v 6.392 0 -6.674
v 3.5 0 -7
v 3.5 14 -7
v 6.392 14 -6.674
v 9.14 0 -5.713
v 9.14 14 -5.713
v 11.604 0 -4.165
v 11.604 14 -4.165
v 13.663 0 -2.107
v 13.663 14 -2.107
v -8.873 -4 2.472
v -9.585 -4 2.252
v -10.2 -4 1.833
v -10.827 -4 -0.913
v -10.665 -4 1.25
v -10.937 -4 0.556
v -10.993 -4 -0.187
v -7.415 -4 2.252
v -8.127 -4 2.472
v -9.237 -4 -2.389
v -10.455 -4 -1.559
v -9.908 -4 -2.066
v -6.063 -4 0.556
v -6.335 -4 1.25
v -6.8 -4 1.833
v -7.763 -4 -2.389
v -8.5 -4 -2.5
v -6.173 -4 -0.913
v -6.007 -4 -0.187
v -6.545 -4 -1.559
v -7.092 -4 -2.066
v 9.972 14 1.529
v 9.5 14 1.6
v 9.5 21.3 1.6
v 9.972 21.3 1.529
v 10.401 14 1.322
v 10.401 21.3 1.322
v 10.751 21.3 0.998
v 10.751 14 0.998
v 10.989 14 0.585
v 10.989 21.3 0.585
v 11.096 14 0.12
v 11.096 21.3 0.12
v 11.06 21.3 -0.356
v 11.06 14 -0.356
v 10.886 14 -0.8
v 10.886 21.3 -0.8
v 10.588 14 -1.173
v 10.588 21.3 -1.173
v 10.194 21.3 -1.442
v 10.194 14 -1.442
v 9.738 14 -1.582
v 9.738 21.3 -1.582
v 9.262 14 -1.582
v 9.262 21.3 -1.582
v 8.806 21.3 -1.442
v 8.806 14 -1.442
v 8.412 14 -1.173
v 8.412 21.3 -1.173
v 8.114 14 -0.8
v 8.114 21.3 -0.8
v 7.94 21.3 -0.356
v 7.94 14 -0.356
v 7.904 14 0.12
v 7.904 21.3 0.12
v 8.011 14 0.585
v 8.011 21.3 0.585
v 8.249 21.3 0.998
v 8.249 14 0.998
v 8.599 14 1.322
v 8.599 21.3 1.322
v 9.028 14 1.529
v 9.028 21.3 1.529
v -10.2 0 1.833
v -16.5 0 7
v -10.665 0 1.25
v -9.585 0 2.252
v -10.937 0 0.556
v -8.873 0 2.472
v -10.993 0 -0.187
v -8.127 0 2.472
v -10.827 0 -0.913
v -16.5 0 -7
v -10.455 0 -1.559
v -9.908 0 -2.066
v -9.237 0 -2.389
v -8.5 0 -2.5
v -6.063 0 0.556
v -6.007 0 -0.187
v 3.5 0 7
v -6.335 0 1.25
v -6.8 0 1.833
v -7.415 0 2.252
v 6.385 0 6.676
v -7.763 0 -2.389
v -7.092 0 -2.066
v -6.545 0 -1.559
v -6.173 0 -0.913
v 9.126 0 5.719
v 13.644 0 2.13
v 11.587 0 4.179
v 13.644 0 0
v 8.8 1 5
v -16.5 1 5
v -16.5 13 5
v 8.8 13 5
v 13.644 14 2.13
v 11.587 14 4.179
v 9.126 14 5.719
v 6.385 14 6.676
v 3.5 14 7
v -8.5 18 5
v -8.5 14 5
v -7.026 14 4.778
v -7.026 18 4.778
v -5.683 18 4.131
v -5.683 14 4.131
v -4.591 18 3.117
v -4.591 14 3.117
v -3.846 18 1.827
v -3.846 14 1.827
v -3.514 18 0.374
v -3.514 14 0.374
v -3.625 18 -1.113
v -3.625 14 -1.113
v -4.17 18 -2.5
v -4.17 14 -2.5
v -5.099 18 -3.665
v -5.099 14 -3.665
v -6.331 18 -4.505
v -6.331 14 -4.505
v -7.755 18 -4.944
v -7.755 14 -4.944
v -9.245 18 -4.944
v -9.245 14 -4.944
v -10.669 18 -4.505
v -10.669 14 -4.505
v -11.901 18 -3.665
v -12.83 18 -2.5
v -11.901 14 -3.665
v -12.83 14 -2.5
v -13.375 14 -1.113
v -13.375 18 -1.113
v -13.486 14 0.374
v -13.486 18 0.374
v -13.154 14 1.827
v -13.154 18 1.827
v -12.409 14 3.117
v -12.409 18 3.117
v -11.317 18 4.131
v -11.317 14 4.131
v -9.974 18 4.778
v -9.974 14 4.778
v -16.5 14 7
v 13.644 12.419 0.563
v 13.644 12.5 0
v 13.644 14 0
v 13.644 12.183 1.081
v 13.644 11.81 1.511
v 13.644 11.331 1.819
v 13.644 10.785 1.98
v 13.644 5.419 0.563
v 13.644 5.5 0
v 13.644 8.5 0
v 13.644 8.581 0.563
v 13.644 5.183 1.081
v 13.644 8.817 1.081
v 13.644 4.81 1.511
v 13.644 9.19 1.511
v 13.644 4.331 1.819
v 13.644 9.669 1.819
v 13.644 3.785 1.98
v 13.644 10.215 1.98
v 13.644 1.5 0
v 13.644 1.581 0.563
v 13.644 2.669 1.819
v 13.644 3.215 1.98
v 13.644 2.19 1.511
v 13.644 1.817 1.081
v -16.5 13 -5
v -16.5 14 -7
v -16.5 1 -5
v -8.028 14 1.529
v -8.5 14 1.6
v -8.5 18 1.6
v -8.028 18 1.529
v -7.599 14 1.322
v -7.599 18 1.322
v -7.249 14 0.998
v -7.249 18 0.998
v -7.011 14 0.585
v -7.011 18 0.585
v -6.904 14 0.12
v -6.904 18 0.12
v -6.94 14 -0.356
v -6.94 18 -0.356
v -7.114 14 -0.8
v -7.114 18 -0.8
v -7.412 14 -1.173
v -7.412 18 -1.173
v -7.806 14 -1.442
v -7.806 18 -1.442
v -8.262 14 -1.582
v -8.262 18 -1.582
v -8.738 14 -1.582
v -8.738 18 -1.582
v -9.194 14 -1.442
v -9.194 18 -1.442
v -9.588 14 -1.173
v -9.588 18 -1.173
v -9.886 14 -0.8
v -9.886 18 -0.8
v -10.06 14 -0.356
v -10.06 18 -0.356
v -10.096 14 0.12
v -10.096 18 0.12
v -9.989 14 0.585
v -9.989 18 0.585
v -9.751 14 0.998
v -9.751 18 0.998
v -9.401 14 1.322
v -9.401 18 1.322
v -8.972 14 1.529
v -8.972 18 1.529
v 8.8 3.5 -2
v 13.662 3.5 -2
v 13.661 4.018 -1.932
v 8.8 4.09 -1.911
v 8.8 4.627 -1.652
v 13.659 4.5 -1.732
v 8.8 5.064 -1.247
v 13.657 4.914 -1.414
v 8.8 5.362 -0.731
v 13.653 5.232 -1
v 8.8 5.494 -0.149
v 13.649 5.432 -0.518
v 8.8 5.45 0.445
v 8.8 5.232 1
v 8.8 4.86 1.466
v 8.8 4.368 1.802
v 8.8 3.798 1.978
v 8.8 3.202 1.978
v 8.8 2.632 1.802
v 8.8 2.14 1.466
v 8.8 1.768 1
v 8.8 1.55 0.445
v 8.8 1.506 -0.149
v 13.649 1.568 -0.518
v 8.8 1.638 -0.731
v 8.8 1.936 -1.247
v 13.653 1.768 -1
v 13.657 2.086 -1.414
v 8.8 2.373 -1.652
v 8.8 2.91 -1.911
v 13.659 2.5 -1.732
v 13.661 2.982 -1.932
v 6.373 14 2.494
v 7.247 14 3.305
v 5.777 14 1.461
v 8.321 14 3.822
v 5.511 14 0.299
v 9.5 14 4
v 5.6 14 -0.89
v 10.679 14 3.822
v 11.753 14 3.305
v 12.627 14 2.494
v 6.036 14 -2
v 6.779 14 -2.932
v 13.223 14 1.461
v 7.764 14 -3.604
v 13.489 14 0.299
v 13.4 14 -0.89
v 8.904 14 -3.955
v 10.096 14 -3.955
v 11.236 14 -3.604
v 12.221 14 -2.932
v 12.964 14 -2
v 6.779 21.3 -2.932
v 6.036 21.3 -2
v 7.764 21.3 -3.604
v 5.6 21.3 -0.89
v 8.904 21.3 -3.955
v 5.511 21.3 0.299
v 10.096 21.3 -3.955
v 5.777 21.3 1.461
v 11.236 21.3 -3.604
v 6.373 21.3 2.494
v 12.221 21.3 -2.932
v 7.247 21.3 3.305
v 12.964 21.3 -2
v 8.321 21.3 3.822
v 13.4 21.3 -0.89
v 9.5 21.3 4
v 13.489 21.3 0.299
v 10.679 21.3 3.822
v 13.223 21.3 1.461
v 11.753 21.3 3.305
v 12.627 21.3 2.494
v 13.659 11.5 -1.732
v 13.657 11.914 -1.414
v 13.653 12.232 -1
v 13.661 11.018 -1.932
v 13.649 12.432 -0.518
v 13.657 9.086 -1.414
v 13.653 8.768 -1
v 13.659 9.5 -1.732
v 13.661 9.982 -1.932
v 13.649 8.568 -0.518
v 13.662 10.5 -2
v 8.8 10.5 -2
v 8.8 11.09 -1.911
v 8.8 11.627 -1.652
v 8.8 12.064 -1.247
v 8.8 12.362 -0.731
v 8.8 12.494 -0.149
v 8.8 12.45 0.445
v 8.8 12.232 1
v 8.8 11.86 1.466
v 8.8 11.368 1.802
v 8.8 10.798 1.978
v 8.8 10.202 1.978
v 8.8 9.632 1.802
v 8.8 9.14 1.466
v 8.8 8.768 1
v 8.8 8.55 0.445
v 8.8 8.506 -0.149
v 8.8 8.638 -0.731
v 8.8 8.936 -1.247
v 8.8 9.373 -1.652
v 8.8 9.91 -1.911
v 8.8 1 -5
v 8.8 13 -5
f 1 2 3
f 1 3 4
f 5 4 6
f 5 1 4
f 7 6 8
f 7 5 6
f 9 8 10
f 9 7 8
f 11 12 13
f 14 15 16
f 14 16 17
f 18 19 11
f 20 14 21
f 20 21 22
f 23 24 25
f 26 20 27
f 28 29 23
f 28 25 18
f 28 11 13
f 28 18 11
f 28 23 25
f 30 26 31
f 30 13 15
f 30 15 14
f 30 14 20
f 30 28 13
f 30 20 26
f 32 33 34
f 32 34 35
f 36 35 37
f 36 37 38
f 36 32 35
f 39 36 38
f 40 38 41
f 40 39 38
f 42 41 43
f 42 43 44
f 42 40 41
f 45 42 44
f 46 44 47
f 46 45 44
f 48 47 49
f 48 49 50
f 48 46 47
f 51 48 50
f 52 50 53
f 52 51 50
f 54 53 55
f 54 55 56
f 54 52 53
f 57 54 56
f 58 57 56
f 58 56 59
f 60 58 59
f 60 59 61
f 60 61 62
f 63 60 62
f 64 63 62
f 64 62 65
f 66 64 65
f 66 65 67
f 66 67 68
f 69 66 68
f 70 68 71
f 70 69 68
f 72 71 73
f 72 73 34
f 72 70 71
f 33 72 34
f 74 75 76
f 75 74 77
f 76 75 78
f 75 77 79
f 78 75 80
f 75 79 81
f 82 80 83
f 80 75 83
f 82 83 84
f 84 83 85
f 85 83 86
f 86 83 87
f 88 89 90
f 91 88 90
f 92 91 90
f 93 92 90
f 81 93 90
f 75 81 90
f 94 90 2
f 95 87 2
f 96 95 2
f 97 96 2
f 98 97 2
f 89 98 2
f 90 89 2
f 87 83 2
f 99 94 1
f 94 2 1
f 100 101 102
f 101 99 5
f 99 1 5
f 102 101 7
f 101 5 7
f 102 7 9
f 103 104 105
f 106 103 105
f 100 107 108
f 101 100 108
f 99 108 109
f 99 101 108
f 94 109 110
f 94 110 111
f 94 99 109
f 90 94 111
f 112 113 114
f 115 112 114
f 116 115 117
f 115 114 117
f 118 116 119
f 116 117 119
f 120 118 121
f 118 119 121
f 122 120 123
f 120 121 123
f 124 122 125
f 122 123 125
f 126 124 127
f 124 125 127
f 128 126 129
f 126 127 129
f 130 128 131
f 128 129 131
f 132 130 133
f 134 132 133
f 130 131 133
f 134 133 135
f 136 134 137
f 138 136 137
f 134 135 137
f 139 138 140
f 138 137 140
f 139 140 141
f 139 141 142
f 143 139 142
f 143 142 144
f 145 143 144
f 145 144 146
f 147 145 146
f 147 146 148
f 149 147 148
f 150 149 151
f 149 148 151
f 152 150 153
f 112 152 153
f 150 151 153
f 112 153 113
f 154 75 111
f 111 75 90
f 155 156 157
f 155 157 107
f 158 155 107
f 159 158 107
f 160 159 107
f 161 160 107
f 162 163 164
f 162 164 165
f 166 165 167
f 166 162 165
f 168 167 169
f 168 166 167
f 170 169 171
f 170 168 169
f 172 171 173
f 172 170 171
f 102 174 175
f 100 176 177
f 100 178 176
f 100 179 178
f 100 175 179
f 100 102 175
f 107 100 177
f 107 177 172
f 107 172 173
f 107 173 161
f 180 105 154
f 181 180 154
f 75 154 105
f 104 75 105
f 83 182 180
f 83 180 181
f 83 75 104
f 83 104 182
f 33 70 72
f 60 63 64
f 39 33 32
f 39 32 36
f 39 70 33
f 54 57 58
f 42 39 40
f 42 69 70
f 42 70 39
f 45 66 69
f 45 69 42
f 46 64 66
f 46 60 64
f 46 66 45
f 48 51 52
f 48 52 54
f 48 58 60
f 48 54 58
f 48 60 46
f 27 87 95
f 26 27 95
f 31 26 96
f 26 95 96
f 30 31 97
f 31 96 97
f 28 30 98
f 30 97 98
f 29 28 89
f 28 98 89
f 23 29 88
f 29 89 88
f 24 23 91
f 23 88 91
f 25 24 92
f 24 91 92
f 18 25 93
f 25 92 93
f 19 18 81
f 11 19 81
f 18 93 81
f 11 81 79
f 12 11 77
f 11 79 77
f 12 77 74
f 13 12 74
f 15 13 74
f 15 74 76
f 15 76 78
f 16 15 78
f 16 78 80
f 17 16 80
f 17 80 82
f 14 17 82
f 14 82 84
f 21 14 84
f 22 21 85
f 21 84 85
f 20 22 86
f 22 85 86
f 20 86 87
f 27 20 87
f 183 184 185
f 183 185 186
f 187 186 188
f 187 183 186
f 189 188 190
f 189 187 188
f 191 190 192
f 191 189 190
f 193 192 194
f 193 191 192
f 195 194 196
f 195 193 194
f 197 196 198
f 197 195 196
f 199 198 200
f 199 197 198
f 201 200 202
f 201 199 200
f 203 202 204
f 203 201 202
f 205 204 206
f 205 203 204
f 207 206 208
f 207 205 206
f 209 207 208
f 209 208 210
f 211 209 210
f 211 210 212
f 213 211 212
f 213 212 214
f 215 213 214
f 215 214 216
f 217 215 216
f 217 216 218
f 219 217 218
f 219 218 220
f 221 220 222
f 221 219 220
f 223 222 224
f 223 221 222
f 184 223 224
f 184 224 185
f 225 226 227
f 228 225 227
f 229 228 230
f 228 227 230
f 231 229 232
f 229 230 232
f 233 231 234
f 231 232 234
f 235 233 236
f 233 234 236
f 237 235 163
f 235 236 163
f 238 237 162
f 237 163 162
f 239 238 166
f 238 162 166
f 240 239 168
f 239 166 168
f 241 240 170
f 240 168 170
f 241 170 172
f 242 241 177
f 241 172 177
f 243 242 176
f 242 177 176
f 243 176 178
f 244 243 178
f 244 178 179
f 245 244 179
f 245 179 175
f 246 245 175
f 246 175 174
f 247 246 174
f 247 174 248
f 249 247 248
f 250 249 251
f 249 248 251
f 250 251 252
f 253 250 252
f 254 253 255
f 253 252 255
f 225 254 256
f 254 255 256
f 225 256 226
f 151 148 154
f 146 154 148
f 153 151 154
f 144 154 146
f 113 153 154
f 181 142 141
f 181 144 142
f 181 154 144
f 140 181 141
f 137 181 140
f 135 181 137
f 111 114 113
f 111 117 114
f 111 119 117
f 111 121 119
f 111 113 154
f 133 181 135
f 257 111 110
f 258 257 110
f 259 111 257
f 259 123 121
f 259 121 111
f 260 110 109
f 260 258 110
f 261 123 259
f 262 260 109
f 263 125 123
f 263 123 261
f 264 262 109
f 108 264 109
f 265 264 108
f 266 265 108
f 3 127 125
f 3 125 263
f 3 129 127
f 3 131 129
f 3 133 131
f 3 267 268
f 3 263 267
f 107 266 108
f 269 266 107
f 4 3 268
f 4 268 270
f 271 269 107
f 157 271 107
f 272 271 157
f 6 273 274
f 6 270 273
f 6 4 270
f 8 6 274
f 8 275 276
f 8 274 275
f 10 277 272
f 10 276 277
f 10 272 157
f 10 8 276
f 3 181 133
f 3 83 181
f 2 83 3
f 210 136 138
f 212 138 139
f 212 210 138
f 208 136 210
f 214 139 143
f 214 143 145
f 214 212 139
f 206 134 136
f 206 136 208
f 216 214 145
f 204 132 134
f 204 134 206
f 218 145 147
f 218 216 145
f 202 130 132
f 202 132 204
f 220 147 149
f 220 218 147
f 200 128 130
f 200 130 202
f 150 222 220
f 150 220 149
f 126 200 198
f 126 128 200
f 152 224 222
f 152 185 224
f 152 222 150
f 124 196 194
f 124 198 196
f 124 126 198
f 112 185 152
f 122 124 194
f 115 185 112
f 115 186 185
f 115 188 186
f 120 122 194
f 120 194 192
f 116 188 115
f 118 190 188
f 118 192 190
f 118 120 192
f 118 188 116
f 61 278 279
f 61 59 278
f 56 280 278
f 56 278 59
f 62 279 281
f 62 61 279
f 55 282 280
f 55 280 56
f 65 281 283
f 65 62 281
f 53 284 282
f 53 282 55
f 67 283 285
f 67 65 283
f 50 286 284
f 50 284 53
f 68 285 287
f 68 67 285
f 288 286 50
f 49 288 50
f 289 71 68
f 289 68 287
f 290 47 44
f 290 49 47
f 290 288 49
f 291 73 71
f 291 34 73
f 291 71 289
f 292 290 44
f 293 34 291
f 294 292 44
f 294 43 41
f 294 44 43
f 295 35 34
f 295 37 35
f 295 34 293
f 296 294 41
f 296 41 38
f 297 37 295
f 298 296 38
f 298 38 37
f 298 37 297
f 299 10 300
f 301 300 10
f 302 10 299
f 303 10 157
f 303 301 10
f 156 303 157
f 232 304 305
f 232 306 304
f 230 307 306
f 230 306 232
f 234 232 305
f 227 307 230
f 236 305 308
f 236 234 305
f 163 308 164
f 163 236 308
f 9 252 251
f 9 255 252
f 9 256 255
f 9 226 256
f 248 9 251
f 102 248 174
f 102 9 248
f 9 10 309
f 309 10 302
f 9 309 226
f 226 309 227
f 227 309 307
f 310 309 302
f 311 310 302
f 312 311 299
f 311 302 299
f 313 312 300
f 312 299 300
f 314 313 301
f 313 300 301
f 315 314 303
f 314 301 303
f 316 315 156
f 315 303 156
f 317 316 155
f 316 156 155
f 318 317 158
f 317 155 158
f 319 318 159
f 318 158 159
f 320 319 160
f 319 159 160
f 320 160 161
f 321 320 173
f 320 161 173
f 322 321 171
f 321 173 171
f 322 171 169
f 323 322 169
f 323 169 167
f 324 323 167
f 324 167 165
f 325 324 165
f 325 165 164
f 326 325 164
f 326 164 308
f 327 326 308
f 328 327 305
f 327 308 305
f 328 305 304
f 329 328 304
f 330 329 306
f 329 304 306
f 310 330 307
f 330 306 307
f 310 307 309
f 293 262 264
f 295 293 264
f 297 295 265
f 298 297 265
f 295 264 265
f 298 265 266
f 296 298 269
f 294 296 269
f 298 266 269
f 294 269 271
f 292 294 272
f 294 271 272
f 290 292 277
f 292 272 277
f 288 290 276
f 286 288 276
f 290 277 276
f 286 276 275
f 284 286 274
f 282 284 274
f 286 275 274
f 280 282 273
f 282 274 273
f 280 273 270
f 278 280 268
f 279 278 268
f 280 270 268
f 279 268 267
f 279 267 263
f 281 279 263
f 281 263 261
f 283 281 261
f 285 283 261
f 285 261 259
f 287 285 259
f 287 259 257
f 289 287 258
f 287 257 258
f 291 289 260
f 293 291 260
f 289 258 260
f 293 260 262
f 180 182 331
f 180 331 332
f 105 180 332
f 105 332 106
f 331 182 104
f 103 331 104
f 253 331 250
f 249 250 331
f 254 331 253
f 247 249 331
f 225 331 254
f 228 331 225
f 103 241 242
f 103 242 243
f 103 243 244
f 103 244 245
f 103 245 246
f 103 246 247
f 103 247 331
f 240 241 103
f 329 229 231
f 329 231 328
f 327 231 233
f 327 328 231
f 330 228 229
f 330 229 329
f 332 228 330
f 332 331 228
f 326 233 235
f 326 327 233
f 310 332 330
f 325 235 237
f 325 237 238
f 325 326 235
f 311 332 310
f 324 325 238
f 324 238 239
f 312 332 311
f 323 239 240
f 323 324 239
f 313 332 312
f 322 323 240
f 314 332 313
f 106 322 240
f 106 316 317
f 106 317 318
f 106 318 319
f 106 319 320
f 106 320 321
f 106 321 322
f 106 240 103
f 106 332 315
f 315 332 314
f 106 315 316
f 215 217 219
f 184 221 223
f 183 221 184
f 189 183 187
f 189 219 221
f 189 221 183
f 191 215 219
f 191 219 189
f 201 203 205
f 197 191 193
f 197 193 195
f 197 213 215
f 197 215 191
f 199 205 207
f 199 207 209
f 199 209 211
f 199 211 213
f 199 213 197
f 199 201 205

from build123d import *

# Parameters (mm, degrees)
SKETCH_1_W               = 33
SKETCH_1_H               = 14
EXTRUDE_1_DEPTH          = 14
SKETCH_2_W               = 10
SKETCH_2_H               = 12
CUT_EXTRUDE_1_DEPTH      = 25.3
SKETCH_3_R               = 2
CUT_EXTRUDE_2_DEPTH      = 25.5
SKETCH_7_R               = 5
SKETCH_7_R_2             = 1.6
EXTRUDE_4_DEPTH          = 4
FILLET_4_DEPTH           = 14
SKETCH_8_R               = 4
SKETCH_8_R_2             = 1.6
EXTRUDE_5_DEPTH          = 7.3
SKETCH_10_R              = 2.5
EXTRUDE_6_DEPTH          = 4
CUT_EXTRUDE_3_DEPTH      = 26.401771619
CUT_EXTRUDE_3_DEPTH_BACK = 20


with BuildPart() as part:
    # 草图1 → 凸台-拉伸1 (new body)
    with BuildSketch(Plane(origin=(0, 0, 0), x_dir=(1, 0, 0), z_dir=(0, 1, 0))):
        Rectangle(SKETCH_1_W, SKETCH_1_H)
    extrude(amount=EXTRUDE_1_DEPTH)

    # 草图2 → 切除-拉伸1 (cut)
    with BuildSketch(Plane.ZY.offset(16.5)):
        with Locations((0, 7)):
            Rectangle(SKETCH_2_W, SKETCH_2_H)
    extrude(amount=-CUT_EXTRUDE_1_DEPTH, mode=Mode.SUBTRACT)

    # 草图3 → 切除-拉伸2 (cut)
    with BuildSketch(Plane(origin=(16.5, 0, 0), x_dir=(0, 0, -1), z_dir=(1, 0, 0))):
        with Locations((0, 10.5)):
            Circle(SKETCH_3_R)
        with Locations((0, 3.5)):
            Circle(SKETCH_3_R)
    extrude(amount=-CUT_EXTRUDE_2_DEPTH, mode=Mode.SUBTRACT)

    # 草图7 → 凸台-拉伸4 (add)
    with BuildSketch(Plane(origin=(0, 14, 0), x_dir=(1, 0, 0), z_dir=(0, 1, 0))):
        with Locations(Location((-8.5, 0, 0), (0, 0, 270))):
            Circle(SKETCH_7_R)
        with Locations(Location((-8.5, 0, 0), (0, 0, 270))):
            Circle(SKETCH_7_R_2, mode=Mode.SUBTRACT)
    extrude(amount=EXTRUDE_4_DEPTH)

    # 圆角4: read off the stored shape, not the designer's step
    # 圆角4 outline → 圆角4 (cut)
    with BuildSketch(Plane(origin=(0, 0, 0), x_dir=(1, 0, 0), z_dir=(0, 1, 0))):
        with BuildLine():
            ThreePointArc((3.5, 7), (10.245368782, 5.113055385), (15.032562595, 0))
            ThreePointArc((15.032562595, 0), (10.245368782, -5.113055385), (3.5, -7))
            Line((3.5, -7), (16.5, -7))
            Line((16.5, -7), (16.5, 7))
            Line((16.5, 7), (3.5, 7))
        make_face()
    extrude(amount=FILLET_4_DEPTH, mode=Mode.SUBTRACT)

    # 草图8 → 凸台-拉伸5 (add)
    with BuildSketch(Plane(origin=(0, 14, 0), x_dir=(1, 0, 0), z_dir=(0, 1, 0))):
        with Locations(Location((9.5, 0, 0), (0, 0, 270))):
            Circle(SKETCH_8_R)
        with Locations(Location((9.5, 0, 0), (0, 0, 270))):
            Circle(SKETCH_8_R_2, mode=Mode.SUBTRACT)
    extrude(amount=EXTRUDE_5_DEPTH)

    # 草图10 → 凸台-拉伸6 (add)
    with BuildSketch(Plane.XZ):
        with Locations(Location((-8.5, 0, 0), (0, 0, 270))):
            Circle(SKETCH_10_R)
    extrude(amount=EXTRUDE_6_DEPTH)

    # 草图11 → 切除-拉伸3 (cut, two sides: drawn at the far end of the back side and taken through both)
    with BuildSketch(Plane(origin=(0, 14, 0), x_dir=(1, 0, 0), z_dir=(0, 1, 0)).offset(-CUT_EXTRUDE_3_DEPTH_BACK)):
        with BuildLine():
            Line((13.662777944, 2.1066605), (13.644074044, 0))
            Line((13.644074044, 0), (15.032562595, 0))
            ThreePointArc((15.032562595, 0), (14.398690512, 1.086504435), (13.662777944, 2.1066605))
        make_face()
        with BuildLine():
            Line((15.032562595, 0), (13.644074044, 0))
            Line((13.644074044, 0), (13.644074044, -2.130053001))
            ThreePointArc((13.644074044, -2.130053001), (14.39051998, -1.099054484), (15.032562595, 0))
        make_face()
    extrude(amount=CUT_EXTRUDE_3_DEPTH + CUT_EXTRUDE_3_DEPTH_BACK, mode=Mode.SUBTRACT)


solid = part.part
